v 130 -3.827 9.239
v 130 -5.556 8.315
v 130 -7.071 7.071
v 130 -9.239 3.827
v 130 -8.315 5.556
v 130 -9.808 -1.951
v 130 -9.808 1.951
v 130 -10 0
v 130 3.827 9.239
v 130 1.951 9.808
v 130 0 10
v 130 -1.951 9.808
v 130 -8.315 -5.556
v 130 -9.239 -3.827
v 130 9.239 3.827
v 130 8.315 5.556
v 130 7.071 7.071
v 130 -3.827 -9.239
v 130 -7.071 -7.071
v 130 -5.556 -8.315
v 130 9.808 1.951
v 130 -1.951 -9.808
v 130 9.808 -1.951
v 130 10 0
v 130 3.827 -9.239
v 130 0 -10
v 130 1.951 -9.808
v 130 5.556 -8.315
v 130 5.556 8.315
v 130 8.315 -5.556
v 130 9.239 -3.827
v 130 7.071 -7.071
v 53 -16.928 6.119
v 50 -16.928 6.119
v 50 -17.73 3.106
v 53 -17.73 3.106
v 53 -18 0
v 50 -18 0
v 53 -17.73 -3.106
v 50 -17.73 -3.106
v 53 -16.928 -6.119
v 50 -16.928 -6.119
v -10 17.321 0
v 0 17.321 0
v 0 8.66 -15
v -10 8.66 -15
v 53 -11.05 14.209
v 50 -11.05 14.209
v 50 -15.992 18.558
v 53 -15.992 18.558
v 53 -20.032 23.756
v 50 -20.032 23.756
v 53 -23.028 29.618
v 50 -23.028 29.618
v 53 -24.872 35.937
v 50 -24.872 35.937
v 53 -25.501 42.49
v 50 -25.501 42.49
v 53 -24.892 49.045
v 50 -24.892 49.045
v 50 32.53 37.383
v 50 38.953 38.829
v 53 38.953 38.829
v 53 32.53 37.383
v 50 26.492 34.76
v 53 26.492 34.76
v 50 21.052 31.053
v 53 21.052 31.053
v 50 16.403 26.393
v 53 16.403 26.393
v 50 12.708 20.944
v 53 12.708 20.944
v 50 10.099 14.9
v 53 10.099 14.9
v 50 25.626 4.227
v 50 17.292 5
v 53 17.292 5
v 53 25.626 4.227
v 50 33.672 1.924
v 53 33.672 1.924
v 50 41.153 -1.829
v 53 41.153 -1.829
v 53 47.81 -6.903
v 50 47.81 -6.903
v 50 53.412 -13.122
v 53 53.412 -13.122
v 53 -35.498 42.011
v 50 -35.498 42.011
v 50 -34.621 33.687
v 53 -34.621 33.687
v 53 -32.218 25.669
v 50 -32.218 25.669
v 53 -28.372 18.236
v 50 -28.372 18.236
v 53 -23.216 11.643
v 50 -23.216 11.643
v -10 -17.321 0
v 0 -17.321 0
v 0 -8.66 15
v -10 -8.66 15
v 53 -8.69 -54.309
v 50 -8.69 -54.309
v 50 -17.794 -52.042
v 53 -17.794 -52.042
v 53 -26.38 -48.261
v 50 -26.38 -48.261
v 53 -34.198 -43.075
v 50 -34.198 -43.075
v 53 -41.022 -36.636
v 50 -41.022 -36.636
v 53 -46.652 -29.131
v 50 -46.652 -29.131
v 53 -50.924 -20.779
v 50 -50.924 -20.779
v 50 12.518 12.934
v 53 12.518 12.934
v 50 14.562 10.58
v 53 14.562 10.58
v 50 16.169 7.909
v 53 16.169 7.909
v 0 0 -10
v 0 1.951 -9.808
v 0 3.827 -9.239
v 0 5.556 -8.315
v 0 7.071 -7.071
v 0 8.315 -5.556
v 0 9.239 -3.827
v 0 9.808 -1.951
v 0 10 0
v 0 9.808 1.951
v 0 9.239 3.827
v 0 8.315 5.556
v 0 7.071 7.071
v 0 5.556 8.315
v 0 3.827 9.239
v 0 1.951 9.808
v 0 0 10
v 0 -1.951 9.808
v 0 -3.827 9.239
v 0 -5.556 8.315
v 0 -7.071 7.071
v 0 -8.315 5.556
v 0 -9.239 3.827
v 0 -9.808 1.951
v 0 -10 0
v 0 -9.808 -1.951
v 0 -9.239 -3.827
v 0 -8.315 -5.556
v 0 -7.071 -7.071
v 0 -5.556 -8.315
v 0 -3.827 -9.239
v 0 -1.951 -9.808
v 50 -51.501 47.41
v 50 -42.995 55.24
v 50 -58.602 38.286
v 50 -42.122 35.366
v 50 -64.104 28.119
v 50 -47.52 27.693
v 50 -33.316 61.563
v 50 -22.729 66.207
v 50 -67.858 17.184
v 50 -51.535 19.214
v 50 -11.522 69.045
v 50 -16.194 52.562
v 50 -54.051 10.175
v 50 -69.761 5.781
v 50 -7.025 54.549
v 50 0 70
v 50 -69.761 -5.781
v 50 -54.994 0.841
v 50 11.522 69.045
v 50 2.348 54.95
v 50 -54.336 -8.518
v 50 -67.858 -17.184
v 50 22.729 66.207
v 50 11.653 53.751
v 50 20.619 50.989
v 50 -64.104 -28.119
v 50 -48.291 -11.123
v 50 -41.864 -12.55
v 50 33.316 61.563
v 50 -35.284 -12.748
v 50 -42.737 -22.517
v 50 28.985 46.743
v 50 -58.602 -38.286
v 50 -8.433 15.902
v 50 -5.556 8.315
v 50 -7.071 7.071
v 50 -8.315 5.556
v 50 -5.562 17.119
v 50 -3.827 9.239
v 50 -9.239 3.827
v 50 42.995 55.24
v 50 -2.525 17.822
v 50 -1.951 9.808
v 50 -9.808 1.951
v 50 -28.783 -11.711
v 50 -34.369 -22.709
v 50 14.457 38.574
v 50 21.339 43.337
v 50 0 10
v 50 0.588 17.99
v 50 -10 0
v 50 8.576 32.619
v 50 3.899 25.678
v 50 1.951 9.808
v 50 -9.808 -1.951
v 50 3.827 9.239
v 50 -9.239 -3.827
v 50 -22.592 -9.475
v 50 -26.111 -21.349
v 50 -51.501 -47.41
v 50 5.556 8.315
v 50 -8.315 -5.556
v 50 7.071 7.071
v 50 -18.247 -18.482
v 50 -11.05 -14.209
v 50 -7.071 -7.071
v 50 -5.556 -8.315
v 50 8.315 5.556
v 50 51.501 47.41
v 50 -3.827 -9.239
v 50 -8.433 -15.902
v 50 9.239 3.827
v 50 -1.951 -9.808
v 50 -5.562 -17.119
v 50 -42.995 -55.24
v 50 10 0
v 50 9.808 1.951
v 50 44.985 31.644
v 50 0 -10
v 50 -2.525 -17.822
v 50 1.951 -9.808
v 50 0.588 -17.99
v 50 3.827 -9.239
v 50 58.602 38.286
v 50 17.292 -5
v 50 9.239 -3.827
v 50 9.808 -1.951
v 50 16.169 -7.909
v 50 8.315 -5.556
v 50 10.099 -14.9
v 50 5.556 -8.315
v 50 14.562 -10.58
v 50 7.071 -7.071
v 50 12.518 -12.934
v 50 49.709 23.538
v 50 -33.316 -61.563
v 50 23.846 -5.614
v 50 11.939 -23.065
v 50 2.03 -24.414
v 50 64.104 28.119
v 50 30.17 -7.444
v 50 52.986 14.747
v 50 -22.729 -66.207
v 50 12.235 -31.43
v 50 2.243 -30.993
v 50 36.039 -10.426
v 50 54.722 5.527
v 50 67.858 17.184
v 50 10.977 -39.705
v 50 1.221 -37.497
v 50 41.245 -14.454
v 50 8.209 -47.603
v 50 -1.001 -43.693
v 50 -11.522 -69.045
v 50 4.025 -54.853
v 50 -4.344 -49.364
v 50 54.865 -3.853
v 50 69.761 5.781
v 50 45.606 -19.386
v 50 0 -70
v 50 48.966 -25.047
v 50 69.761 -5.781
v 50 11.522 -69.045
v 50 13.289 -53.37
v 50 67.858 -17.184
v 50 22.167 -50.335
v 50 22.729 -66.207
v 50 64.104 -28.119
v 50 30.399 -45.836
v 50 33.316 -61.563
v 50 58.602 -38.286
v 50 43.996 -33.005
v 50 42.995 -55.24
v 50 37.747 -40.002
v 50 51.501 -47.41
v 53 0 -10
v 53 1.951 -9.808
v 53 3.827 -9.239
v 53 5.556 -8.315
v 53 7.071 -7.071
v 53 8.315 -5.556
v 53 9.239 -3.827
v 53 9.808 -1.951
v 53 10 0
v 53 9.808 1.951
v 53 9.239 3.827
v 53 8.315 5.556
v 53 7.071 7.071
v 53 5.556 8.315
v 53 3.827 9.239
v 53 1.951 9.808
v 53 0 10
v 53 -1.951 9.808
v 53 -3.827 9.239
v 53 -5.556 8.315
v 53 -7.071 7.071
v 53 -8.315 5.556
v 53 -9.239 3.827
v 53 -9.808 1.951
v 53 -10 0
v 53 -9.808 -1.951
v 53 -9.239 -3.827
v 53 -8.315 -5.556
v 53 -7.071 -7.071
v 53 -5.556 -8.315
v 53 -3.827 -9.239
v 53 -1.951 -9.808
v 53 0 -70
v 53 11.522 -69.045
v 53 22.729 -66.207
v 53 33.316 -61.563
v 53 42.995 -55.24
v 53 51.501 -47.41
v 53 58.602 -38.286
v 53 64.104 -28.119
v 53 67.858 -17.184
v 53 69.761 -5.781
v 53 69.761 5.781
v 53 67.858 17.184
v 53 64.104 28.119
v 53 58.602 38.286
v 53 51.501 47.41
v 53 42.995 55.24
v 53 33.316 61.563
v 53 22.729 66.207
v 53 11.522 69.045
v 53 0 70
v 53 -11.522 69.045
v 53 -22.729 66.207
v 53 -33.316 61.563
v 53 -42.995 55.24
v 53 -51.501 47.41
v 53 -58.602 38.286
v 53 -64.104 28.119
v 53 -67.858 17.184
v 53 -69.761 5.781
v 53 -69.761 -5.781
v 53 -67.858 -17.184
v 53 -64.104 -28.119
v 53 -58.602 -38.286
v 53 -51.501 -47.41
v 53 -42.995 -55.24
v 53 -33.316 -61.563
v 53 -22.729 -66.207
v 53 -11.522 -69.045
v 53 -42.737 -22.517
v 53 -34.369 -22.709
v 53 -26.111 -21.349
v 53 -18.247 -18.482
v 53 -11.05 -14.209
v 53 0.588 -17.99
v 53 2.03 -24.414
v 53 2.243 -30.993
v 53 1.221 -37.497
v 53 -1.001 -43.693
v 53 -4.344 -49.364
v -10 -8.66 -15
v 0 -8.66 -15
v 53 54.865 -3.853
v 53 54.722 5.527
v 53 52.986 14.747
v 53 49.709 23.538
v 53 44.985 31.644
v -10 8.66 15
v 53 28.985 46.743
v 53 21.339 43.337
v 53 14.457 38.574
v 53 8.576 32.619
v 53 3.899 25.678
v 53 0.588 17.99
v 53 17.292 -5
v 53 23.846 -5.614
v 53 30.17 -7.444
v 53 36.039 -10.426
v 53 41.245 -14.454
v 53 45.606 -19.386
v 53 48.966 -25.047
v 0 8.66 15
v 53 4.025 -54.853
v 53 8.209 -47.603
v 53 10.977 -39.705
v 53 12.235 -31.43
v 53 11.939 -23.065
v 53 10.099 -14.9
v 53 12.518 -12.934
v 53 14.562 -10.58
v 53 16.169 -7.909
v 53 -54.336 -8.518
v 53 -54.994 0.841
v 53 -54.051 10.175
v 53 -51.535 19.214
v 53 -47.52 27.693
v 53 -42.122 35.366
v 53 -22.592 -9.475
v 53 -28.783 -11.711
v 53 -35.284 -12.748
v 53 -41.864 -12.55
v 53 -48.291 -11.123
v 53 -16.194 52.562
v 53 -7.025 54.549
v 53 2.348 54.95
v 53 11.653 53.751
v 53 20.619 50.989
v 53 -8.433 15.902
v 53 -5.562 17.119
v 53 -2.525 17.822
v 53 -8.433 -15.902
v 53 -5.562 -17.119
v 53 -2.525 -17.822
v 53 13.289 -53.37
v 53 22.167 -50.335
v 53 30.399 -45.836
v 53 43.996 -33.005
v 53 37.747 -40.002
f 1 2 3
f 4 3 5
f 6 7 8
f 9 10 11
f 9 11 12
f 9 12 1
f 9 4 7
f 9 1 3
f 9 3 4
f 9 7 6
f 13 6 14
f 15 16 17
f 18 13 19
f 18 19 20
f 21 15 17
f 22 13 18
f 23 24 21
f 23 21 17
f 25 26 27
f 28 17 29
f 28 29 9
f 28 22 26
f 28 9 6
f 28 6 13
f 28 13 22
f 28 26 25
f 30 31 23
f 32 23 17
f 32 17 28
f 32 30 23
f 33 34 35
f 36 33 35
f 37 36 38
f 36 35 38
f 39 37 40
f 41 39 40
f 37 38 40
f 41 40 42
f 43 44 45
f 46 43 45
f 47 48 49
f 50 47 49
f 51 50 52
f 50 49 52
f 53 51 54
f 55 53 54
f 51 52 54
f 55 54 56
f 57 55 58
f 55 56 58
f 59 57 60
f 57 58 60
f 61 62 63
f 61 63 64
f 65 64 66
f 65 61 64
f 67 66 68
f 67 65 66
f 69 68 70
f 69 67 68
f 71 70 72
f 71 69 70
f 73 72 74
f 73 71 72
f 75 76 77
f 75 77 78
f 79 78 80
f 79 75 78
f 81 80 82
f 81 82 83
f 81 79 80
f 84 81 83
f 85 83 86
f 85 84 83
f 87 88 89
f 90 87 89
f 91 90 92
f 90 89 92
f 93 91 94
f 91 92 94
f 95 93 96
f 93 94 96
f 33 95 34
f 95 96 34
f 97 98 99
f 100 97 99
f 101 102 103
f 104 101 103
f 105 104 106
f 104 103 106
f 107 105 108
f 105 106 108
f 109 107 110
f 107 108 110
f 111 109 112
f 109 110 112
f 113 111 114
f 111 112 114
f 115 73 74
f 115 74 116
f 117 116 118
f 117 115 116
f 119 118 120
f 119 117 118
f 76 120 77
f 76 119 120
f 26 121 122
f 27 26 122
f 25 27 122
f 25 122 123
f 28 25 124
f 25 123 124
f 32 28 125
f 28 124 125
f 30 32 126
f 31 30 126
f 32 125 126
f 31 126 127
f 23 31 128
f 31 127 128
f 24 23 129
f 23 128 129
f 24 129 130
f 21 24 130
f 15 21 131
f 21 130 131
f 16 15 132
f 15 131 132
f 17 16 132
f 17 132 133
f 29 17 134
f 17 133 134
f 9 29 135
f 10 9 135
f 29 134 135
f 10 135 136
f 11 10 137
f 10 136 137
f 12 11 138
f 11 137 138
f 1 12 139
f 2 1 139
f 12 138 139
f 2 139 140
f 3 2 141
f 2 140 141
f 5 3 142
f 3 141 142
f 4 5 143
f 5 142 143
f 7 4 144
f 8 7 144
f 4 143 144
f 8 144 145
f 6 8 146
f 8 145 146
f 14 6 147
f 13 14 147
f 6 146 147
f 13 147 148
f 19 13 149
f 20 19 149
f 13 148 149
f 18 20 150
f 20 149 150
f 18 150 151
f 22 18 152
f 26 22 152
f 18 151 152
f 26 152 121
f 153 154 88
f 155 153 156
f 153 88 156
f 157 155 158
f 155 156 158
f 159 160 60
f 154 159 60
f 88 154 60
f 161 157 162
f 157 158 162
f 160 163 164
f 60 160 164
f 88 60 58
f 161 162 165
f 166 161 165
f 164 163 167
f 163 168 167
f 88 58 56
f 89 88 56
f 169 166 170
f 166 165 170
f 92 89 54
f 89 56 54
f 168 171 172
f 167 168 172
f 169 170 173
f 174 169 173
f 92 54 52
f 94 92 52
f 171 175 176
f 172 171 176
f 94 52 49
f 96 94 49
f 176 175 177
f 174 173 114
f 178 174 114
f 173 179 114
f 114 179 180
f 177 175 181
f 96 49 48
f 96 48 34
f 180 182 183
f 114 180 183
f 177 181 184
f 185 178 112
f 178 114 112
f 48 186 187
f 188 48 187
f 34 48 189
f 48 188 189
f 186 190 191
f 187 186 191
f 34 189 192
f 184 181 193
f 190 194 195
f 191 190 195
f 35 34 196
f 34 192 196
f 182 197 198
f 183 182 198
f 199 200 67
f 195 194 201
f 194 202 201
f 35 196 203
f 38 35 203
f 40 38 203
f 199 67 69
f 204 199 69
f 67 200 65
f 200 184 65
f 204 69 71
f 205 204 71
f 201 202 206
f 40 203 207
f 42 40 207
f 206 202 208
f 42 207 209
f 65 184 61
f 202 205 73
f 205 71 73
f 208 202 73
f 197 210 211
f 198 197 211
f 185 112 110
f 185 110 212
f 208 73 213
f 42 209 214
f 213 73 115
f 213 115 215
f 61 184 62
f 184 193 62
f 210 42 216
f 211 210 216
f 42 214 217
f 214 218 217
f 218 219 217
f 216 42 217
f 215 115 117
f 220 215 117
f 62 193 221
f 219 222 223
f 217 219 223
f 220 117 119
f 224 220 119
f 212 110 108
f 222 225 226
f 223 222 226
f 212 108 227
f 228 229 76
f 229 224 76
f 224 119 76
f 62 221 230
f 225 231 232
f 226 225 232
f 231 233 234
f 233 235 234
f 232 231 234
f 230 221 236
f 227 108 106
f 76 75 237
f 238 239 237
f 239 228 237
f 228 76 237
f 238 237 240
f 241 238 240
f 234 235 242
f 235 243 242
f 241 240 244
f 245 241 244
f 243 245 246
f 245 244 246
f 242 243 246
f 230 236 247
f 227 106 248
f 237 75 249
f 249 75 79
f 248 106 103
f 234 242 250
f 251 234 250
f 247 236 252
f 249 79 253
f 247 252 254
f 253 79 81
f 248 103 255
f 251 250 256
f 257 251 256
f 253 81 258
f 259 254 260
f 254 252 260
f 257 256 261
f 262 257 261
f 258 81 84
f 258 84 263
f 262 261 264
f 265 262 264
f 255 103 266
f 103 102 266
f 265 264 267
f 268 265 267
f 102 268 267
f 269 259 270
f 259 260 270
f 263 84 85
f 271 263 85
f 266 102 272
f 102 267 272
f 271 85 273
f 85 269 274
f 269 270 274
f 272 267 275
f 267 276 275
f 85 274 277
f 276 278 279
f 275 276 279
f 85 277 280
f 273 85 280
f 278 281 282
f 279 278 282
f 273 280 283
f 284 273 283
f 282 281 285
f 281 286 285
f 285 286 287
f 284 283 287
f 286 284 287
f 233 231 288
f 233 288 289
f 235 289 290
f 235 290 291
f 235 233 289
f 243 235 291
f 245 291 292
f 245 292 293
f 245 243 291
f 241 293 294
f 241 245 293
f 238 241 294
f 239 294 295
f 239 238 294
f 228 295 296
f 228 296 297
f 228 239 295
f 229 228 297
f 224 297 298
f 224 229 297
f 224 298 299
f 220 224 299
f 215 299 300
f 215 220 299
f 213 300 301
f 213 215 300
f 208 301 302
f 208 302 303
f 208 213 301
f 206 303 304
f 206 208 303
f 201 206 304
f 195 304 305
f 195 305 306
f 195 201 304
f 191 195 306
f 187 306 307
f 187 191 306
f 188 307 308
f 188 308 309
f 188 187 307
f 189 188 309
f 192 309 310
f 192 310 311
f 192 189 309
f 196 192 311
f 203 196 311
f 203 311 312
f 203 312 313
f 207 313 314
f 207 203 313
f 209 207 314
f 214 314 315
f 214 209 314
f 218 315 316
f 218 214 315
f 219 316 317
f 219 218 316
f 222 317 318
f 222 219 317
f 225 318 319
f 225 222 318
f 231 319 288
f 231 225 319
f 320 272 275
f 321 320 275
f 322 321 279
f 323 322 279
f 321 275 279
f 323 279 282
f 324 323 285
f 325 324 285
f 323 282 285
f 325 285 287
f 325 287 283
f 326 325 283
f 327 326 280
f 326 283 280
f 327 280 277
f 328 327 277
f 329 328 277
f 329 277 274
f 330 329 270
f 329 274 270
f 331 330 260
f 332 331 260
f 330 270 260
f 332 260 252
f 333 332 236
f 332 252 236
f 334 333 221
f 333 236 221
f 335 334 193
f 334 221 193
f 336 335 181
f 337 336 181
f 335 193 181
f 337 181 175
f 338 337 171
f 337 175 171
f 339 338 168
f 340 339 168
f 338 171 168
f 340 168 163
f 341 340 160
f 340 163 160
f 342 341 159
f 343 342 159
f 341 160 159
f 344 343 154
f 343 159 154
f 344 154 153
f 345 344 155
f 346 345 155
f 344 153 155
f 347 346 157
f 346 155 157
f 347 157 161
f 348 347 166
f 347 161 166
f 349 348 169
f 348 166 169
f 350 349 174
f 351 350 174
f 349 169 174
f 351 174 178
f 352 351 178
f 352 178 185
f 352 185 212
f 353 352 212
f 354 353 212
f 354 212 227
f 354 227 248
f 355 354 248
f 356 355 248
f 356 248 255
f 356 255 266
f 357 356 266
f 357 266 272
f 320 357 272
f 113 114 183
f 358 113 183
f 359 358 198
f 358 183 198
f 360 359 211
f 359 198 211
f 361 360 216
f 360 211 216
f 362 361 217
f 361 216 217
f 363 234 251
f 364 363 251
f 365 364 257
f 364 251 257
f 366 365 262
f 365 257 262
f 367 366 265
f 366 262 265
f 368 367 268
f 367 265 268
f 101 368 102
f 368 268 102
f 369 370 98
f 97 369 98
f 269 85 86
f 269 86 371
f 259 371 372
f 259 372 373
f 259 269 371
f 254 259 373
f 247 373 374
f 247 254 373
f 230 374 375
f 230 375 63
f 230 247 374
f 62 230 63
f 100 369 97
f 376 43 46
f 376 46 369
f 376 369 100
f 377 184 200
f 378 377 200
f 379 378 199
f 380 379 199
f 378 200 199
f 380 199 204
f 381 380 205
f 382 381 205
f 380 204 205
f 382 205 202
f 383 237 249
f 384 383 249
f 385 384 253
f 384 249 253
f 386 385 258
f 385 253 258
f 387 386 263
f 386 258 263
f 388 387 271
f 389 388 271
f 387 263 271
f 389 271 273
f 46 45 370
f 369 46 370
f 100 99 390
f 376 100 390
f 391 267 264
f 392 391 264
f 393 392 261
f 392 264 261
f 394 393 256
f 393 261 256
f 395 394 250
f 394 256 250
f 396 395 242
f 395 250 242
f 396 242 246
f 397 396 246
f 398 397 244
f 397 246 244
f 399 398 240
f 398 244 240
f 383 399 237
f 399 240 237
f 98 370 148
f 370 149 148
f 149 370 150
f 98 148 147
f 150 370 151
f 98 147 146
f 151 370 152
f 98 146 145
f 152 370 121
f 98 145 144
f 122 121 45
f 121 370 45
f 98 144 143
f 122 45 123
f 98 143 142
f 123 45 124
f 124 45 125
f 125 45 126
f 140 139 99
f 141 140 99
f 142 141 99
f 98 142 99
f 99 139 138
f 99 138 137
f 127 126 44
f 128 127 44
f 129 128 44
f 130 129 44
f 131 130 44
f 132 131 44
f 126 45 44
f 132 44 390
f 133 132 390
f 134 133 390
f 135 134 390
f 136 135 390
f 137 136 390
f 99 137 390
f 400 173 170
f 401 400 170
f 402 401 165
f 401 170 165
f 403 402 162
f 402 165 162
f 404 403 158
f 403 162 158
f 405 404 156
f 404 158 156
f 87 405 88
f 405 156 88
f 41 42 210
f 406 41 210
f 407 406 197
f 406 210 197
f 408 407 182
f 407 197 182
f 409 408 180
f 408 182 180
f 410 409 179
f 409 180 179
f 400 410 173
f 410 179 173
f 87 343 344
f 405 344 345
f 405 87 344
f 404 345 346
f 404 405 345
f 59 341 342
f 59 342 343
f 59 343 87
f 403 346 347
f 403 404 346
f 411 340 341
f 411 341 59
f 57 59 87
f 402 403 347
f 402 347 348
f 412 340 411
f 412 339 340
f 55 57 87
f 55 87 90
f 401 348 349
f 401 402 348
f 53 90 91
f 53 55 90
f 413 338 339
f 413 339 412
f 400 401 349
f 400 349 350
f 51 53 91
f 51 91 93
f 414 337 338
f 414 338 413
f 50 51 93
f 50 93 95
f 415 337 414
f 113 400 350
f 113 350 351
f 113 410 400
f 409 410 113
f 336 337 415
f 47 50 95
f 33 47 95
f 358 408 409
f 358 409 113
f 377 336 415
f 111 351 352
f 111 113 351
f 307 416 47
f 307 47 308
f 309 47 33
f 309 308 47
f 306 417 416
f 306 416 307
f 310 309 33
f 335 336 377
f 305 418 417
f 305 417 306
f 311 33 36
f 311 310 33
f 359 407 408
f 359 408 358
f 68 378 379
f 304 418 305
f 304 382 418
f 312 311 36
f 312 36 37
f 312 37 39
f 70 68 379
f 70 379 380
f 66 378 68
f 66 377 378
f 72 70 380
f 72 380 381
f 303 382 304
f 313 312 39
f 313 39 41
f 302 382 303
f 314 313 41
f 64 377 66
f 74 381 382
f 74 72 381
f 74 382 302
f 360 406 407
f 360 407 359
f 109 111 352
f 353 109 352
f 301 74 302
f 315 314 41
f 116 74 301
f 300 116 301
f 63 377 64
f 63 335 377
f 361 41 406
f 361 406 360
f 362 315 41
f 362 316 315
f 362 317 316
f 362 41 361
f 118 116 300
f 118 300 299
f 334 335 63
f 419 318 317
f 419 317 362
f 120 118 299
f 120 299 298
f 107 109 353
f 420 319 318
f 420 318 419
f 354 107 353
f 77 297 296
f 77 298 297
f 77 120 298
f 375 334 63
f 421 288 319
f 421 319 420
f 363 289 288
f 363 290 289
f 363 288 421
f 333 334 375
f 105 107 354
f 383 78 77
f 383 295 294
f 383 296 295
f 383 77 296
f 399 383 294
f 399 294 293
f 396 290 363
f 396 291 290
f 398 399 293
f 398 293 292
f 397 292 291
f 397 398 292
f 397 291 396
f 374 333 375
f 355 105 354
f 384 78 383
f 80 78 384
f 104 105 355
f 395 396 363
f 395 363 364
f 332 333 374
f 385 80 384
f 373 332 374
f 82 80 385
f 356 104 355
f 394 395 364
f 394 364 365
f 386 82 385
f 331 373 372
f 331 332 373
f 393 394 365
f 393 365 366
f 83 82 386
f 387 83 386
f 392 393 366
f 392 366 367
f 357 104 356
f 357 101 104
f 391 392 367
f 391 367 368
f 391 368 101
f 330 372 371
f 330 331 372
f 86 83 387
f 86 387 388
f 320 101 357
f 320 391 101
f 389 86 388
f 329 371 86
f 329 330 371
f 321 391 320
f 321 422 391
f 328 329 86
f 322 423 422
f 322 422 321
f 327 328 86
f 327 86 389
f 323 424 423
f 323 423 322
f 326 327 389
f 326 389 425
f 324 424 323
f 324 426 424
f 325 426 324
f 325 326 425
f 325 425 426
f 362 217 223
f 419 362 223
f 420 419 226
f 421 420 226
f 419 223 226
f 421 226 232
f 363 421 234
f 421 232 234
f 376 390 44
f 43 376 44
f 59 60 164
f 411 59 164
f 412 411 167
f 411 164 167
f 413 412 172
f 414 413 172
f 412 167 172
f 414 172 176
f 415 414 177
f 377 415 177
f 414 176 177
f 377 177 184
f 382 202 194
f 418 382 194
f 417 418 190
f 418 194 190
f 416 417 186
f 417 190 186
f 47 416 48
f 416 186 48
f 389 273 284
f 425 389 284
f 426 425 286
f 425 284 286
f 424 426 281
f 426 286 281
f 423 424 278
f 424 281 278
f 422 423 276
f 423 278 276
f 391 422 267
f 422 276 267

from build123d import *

# Parameters (mm, degrees)
SKETCH1_R           = 10
BOSS_EXTRUDE1_DEPTH = 130
BOSS_EXTRUDE2_DEPTH = 10
BOSS_EXTRUDE3_START = 50
SKETCH3_R           = 70
SKETCH3_R_2         = 10
BOSS_EXTRUDE3_DEPTH = 3


with BuildPart() as part:
    # Sketch1 → Boss-Extrude1 (new body)
    with BuildSketch(Plane(origin=(0, 0, 0), x_dir=(0, 0, -1), z_dir=(1, 0, 0))):
        Circle(SKETCH1_R)
    extrude(amount=BOSS_EXTRUDE1_DEPTH)

    # Sketch2 → Boss-Extrude2 (add)
    with BuildSketch(Plane.ZY):
        Polygon((0, 17.320508076), (-15, 8.660254038), (-15, -8.660254038), (0, -17.320508076), (15, -8.660254038), (15, 8.660254038), align=None)
    extrude(amount=BOSS_EXTRUDE2_DEPTH)


with BuildPart() as body_2:
    # Sketch3 → Boss-Extrude3 (new body)
    with BuildSketch(Plane(origin=(0, 0, 0), x_dir=(0, 0, -1), z_dir=(1, 0, 0)).offset(BOSS_EXTRUDE3_START)):
        Circle(SKETCH3_R)
        Circle(SKETCH3_R_2, mode=Mode.SUBTRACT)
        with BuildLine():
            ThreePointArc((13.122046564, 53.411720567), (-14.747190765, 52.986039336), (-38.829078481, 38.952569419))
            ThreePointArc((-38.829078481, 38.952569419), (-31.053051118, 21.052137421), (-14.900212579, 10.098696208))
            ThreePointArc((-14.900212579, 10.098696208), (-10.580125614, 14.562312385), (-4.999990727, 17.291619147))
            ThreePointArc((-4.999990727, 17.291619147), (-0.221575627, 37.50032111), (13.122046564, 53.411720567))
        make_face(mode=Mode.SUBTRACT)
        with BuildLine():
            ThreePointArc((5.000011927, 17.291613017), (10.425851953, 36.038674848), (25.047249846, 48.965654036))
            ThreePointArc((25.047249846, 48.965654036), (45.835585418, 30.398998494), (54.852500281, 4.025321462))
            ThreePointArc((54.852500281, 4.025321462), (35.59645412, 11.798967461), (14.900224961, 10.098677939))
            ThreePointArc((14.900224961, 10.098677939), (10.580143468, 14.562299413), (5.000011927, 17.291613017))
        make_face(mode=Mode.SUBTRACT)
        with BuildLine():
            ThreePointArc((17.990389895, 0.588108357), (37.496581987, 1.220988545), (54.30913021, -8.690130944))
            ThreePointArc((54.30913021, -8.690130944), (43.075140448, -34.198425043), (20.778662977, -50.923935088))
            ThreePointArc((20.778662977, -50.923935088), (22.221394152, -30.208158187), (14.208836193, -11.050292939))
            ThreePointArc((14.208836193, -11.050292939), (17.119013883, -5.562316393), (17.990389895, 0.588108357))
        make_face(mode=Mode.SUBTRACT)
        with BuildLine():
            ThreePointArc((6.118660498, -16.928142063), (12.748310177, -35.284062427), (8.517638523, -54.336450326))
            ThreePointArc((8.517638523, -54.336450326), (-19.213684551, -51.534787532), (-42.010580321, -35.498044187))
            ThreePointArc((-42.010580321, -35.498044187), (-21.862877257, -30.468635958), (-6.118681253, -16.928134561))
            ThreePointArc((-6.118681253, -16.928134561), (-1.1035e-05, -18), (6.118660498, -16.928142063))
        make_face(mode=Mode.SUBTRACT)
        with BuildLine():
            ThreePointArc((-14.208849741, -11.050275519), (-29.617692999, -23.027738386), (-49.044940099, -24.891642186))
            ThreePointArc((-49.044940099, -24.891642186), (-54.949850549, 2.348174745), (-46.742629503, 28.984937246))
            ThreePointArc((-46.742629503, 28.984937246), (-35.733395389, 11.377505574), (-17.990389174, 0.588130414))
            ThreePointArc((-17.990389174, 0.588130414), (-17.119020703, -5.562295404), (-14.208849741, -11.050275519))
        make_face(mode=Mode.SUBTRACT)
    extrude(amount=BOSS_EXTRUDE3_DEPTH)


solid = Compound([part.part, body_2.part])
